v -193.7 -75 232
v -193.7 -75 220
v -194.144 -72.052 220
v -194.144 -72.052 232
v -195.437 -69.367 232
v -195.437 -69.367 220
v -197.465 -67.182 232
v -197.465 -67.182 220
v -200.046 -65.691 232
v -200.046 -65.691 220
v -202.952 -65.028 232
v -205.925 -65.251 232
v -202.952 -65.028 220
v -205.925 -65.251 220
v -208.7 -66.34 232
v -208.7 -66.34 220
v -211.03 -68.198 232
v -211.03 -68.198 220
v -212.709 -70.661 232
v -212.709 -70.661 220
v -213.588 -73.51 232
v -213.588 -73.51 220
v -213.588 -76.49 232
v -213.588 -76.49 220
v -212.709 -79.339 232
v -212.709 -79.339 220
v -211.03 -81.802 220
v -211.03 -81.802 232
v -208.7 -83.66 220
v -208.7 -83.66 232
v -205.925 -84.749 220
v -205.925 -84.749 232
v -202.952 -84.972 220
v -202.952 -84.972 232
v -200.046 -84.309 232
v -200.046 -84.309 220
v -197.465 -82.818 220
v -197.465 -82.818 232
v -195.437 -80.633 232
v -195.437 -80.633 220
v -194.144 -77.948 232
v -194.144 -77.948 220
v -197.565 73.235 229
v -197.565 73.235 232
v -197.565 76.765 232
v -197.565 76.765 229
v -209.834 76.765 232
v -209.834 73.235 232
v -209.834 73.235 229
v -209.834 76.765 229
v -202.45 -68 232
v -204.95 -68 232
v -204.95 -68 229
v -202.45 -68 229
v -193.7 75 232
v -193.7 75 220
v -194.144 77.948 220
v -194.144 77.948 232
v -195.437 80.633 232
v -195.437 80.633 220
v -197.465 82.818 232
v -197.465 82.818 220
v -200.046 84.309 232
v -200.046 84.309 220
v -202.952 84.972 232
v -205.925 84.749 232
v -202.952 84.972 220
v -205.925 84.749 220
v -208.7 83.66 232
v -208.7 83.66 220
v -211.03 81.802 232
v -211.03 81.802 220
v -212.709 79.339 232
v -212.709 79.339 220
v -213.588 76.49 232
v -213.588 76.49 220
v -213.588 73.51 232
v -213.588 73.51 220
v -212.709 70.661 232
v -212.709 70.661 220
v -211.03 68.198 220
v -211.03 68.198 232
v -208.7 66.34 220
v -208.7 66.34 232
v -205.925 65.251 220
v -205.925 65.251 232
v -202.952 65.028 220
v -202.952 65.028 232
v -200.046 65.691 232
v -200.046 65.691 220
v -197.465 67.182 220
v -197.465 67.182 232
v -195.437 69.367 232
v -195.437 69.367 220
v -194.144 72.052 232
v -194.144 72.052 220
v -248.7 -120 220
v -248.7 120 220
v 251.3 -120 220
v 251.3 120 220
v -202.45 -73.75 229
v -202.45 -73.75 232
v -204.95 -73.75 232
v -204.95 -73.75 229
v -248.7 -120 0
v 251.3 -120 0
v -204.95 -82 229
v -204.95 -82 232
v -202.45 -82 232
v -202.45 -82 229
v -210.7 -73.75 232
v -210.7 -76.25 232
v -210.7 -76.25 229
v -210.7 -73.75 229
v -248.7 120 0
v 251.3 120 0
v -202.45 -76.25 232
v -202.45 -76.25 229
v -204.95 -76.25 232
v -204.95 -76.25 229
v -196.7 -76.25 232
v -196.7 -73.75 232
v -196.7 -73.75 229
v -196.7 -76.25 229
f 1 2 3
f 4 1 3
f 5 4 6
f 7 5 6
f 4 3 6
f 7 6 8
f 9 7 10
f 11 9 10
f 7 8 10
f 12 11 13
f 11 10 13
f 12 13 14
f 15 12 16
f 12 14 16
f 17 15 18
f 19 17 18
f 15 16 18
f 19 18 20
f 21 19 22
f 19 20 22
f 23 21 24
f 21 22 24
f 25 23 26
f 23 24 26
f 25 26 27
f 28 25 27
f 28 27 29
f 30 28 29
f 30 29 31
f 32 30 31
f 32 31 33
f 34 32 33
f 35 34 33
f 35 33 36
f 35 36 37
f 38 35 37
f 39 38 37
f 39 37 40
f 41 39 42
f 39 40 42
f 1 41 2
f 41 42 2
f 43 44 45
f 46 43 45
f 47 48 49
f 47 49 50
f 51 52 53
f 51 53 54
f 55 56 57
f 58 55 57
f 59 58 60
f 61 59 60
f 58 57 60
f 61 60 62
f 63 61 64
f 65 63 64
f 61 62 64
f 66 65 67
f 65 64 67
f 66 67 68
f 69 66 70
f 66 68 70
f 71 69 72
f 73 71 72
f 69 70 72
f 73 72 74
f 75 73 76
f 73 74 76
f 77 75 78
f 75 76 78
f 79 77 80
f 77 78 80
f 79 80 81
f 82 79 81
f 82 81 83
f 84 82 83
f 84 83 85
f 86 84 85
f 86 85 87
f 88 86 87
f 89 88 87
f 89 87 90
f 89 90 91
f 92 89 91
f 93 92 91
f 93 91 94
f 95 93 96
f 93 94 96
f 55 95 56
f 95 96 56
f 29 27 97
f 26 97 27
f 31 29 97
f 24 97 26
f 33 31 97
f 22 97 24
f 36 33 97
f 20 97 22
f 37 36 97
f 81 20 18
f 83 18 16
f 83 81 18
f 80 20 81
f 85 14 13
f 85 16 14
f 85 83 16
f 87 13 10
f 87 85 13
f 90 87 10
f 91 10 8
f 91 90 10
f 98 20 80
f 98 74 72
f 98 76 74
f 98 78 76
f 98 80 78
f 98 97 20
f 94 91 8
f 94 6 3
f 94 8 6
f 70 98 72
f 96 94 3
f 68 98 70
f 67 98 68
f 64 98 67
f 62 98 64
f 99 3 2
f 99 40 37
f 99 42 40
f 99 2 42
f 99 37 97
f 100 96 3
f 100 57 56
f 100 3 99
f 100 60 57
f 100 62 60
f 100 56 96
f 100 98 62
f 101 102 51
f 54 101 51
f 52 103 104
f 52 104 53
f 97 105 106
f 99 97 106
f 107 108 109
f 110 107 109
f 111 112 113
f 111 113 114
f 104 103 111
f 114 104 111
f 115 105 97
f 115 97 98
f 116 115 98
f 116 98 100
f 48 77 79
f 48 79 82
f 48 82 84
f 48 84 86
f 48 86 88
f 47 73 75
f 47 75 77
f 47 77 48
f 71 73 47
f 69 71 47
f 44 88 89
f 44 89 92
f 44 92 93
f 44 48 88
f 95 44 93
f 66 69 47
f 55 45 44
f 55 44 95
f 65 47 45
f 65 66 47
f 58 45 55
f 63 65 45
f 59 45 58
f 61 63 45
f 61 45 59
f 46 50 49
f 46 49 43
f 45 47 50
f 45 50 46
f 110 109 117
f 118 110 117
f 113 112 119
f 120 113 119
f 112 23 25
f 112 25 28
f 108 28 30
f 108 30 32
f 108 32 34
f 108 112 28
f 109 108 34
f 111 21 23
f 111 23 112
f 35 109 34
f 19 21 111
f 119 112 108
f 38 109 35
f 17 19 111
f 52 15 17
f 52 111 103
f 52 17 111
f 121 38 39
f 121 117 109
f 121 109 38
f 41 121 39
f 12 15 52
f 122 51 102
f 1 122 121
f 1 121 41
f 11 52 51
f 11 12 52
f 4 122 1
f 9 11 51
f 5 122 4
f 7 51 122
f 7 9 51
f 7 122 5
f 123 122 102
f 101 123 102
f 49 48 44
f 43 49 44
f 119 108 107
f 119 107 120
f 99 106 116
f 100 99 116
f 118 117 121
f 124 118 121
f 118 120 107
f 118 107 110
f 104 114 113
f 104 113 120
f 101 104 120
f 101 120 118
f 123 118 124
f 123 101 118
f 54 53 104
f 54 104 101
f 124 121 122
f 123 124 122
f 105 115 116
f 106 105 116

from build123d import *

# Parameters (mm, degrees)
F0_W     = 500
F0_H     = 240
F1_DEPTH = 220
F2_R     = 10
F3_DEPTH = 12
F4_W     = 12.269224124
F4_H     = 3.53
F4_W_2   = 5.75
F4_H_2   = 2.5
F4_W_3   = 2.5
F4_H_3   = 5.75
F5_DEPTH = 3


with BuildPart() as f1:
    # F0 (on Top) → F1 (new body)
    with BuildSketch(Plane.XY):
        with Locations((1.3003092026, 0)):
            Rectangle(F0_W, F0_H)
    extrude(amount=F1_DEPTH)

    # F2 (on face) → F3 (join)
    with BuildSketch(Plane.XY.offset(220)):
        with Locations((-203.6996907974, 75)):
            Circle(F2_R)
        with Locations((-203.6996907974, -75)):
            Circle(F2_R)
    extrude(amount=F3_DEPTH)

    # F4 (on face) → F5 (cut)
    with BuildSketch(Plane.XY.offset(232)):
        with Locations((-203.6996907974, 75)):
            Rectangle(F4_W, F4_H)
        with Locations((-207.8246907974, -75)):
            Rectangle(F4_W_2, F4_H_2)
        with Locations((-203.6996907974, -75)):
            Rectangle(F4_W_3, F4_H_2)
        with Locations((-199.5746907974, -75)):
            Rectangle(F4_W_2, F4_H_2)
        with Locations((-203.6996907974, -70.875)):
            Rectangle(F4_W_3, F4_H_3)
        with Locations((-203.6996907974, -79.125)):
            Rectangle(F4_W_3, F4_H_3)
    extrude(amount=-F5_DEPTH, mode=Mode.SUBTRACT)


solid = f1.part
